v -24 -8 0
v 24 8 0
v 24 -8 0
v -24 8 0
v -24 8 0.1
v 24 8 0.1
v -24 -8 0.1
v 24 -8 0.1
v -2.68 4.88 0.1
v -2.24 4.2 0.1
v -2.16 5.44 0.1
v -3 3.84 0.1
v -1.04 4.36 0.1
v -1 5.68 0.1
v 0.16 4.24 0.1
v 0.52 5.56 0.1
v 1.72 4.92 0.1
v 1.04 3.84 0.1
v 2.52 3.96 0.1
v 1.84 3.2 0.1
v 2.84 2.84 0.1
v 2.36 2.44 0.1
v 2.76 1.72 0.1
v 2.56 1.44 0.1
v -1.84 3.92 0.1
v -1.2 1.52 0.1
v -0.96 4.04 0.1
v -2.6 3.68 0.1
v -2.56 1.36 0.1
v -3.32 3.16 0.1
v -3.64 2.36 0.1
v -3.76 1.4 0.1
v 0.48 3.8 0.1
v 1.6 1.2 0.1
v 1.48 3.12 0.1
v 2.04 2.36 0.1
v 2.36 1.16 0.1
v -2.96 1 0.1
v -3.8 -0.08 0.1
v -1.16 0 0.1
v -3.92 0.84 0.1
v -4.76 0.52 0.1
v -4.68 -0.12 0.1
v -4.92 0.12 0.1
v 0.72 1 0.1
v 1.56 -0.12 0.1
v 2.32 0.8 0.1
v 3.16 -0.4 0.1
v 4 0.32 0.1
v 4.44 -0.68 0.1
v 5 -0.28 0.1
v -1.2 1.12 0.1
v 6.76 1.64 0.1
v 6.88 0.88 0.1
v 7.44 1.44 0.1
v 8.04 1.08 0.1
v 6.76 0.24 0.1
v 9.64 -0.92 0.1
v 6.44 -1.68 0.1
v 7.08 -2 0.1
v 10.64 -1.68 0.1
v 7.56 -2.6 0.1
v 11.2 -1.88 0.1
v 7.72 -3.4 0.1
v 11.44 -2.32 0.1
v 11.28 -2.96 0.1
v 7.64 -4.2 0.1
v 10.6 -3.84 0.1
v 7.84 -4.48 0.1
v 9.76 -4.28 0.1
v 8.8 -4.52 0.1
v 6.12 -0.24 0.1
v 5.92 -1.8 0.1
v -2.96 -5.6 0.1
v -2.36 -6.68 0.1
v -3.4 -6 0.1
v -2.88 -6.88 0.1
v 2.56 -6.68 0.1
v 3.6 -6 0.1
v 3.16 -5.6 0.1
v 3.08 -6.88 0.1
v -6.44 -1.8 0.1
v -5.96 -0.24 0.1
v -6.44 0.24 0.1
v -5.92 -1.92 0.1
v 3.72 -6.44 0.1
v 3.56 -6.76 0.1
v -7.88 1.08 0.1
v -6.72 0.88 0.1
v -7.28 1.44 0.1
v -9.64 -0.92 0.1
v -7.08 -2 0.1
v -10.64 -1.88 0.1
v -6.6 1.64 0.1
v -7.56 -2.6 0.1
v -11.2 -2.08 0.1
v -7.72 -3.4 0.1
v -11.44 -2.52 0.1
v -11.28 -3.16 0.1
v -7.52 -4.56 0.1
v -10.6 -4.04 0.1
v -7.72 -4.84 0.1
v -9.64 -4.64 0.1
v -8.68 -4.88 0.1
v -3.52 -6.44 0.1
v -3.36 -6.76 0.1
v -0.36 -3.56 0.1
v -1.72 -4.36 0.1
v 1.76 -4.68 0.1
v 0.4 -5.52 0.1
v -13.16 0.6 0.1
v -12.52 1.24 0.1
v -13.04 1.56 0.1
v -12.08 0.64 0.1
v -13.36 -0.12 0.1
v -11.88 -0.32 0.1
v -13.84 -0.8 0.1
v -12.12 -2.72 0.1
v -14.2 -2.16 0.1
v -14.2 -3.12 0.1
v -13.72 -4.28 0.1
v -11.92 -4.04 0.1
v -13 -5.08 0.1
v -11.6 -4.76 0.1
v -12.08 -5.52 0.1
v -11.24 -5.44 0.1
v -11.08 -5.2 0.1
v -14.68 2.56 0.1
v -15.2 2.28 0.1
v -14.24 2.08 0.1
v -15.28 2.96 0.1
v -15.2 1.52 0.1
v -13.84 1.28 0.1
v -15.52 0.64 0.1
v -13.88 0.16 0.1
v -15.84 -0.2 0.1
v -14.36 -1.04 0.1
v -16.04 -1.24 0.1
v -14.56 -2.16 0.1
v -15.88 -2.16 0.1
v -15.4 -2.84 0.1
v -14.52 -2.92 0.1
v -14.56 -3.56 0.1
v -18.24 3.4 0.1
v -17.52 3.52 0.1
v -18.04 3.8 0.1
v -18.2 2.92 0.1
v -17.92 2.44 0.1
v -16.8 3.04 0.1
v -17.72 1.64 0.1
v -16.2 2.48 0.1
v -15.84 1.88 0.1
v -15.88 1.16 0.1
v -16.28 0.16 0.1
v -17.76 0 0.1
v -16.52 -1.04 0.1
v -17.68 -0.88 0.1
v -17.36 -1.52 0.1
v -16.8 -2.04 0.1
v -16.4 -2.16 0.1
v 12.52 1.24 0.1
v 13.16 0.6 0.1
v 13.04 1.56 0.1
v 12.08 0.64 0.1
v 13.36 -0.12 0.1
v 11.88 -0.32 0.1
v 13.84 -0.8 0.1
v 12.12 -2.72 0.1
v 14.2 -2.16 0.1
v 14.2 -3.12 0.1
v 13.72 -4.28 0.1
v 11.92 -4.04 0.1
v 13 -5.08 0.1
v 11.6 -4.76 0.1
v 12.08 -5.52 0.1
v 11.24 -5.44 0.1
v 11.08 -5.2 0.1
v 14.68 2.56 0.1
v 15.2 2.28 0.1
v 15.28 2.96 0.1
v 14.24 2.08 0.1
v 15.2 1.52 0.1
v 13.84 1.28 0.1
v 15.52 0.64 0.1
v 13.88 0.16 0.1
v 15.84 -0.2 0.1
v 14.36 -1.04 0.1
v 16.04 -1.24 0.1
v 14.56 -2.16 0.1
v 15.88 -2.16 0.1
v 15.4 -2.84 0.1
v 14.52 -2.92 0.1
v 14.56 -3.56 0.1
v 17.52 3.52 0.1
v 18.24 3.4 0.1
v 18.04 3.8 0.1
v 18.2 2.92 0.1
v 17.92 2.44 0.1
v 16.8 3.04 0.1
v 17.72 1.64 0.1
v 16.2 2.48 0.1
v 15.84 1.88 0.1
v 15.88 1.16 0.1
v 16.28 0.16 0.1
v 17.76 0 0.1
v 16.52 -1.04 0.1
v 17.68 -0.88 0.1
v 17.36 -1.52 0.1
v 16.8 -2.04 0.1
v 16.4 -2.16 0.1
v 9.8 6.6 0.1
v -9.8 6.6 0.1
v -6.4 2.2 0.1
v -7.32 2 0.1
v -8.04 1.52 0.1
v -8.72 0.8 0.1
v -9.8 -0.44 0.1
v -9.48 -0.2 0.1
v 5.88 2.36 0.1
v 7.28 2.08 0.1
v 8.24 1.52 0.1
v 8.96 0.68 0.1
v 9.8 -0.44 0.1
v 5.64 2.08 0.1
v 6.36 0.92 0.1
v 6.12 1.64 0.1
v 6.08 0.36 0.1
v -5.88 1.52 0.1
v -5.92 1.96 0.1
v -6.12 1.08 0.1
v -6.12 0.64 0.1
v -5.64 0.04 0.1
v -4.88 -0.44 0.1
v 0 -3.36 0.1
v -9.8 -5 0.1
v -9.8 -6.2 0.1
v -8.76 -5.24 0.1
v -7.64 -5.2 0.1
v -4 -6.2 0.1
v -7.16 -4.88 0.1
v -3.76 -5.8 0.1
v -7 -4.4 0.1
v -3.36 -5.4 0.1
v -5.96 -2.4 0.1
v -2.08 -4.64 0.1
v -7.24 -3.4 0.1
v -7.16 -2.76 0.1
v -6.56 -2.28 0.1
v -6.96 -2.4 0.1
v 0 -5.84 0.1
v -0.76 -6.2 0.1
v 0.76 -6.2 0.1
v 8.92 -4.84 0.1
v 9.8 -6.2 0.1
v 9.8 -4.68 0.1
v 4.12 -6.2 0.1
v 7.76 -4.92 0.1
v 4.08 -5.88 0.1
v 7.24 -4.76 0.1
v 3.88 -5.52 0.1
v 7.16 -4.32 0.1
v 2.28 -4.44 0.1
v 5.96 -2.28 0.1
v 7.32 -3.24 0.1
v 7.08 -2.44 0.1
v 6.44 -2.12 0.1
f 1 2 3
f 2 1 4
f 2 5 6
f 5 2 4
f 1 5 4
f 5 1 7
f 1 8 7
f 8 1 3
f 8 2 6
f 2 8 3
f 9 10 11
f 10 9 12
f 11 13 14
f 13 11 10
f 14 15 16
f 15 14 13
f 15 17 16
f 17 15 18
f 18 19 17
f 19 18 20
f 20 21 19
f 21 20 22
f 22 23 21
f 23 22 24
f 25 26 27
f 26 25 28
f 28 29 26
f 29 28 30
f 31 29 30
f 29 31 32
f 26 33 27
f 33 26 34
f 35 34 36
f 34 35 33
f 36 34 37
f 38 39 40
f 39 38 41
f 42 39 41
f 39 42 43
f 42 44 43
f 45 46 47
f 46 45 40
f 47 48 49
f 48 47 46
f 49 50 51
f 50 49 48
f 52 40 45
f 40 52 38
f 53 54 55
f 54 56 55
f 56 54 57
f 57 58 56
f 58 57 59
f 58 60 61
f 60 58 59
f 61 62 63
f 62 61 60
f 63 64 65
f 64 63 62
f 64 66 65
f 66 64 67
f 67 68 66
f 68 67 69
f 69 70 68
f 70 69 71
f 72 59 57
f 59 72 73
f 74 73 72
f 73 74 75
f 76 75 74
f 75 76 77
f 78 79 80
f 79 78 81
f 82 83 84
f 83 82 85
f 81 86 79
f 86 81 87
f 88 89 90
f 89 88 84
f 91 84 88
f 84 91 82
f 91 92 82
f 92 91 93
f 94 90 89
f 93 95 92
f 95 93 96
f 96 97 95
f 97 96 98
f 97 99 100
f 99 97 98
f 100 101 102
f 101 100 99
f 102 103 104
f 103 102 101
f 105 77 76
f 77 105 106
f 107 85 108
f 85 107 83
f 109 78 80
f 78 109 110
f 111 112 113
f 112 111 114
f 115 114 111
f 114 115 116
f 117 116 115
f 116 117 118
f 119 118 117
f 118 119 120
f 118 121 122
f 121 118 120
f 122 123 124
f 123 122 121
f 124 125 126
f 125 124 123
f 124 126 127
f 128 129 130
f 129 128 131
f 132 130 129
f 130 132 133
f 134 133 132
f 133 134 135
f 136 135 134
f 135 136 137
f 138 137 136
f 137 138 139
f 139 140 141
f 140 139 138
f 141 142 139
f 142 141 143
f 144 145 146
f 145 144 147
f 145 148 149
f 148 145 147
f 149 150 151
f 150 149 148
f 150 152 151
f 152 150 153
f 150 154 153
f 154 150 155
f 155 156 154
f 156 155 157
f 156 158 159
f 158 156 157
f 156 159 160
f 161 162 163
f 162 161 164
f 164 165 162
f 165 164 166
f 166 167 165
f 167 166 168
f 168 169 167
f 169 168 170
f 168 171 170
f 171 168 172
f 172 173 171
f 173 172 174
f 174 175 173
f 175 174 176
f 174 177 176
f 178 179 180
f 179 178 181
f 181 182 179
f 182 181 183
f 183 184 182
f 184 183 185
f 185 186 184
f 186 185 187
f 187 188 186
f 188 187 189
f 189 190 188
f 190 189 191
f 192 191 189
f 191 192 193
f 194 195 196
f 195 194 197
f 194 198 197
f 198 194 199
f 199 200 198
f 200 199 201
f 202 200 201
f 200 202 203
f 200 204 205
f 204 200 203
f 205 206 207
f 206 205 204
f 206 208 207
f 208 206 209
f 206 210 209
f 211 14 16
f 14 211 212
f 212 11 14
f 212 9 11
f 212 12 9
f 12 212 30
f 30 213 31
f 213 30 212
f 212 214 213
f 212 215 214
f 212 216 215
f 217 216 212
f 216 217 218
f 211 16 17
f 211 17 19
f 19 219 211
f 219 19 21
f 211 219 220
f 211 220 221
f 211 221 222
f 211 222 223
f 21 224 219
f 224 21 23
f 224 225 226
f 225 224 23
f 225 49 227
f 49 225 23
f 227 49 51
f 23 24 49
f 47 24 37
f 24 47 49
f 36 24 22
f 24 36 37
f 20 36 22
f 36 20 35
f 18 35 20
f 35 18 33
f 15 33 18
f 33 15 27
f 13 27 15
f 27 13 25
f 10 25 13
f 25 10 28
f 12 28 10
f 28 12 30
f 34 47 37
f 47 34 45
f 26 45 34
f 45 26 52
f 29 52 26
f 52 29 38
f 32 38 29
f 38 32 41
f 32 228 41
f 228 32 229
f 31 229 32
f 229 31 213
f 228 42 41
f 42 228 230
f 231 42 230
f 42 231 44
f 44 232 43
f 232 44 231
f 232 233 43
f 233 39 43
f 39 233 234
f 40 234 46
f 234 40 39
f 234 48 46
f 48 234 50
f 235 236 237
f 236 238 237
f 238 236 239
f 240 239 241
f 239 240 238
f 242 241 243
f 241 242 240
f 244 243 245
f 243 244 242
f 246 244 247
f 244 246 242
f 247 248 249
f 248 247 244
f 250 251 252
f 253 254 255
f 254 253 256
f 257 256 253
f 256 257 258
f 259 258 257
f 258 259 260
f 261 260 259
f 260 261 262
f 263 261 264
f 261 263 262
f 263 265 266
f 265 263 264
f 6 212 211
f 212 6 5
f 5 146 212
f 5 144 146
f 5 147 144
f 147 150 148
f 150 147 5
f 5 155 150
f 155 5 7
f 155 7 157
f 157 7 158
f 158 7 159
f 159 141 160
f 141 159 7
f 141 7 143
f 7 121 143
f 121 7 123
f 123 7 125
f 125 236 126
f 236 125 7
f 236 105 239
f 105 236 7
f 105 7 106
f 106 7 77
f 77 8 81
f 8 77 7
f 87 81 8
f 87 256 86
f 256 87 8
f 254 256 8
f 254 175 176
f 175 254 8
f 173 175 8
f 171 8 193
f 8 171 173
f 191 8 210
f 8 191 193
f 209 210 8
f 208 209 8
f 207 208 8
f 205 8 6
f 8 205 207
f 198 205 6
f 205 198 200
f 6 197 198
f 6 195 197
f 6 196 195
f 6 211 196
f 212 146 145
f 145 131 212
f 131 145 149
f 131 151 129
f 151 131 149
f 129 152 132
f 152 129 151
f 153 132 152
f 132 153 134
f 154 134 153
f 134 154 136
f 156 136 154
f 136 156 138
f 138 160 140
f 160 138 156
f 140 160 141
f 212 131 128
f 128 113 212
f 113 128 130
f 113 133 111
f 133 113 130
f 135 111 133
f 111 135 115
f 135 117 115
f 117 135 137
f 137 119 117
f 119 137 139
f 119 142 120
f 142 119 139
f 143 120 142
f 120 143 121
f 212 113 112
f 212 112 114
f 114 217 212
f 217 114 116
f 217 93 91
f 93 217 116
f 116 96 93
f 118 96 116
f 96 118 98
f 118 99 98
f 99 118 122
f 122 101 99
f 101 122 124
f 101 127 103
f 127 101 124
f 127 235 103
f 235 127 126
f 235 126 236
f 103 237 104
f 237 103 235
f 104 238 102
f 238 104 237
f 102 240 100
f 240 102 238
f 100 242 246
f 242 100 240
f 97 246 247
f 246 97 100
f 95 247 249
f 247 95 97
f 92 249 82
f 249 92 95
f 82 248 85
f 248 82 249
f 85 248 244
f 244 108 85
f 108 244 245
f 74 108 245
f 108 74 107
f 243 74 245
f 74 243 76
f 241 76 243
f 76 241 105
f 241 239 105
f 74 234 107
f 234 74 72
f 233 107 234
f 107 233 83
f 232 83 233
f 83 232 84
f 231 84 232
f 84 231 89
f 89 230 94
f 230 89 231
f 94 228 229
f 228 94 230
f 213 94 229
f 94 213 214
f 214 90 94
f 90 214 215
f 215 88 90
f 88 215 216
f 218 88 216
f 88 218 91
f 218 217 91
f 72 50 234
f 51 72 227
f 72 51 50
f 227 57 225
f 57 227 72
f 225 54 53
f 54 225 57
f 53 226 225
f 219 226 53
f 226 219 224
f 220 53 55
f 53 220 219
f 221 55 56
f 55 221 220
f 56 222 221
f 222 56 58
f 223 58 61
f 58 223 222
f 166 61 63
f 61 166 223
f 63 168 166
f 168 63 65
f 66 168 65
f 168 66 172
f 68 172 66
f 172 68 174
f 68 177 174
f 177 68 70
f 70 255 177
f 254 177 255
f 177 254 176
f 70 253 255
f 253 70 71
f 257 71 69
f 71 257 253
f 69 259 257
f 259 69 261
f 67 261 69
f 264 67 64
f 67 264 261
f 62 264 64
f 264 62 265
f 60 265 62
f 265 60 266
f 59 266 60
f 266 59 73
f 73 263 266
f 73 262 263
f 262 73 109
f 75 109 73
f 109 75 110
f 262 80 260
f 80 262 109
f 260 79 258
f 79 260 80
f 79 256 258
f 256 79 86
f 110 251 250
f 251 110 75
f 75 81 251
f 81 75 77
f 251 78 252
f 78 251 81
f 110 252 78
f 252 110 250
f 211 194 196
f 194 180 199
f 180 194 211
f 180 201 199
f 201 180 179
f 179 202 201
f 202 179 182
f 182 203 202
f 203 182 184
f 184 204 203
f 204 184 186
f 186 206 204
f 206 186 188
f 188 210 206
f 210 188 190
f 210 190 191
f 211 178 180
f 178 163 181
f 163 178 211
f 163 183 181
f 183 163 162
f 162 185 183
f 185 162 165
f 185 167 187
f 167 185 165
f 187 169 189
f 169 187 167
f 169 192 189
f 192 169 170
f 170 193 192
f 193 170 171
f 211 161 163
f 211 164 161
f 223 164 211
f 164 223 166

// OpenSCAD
// file: ../p/box5-12.scad
use <../lib.scad>
function ldraw_lib__box5_12() = [
// 0 Box with 5 Faces without Any Edges
// 0 Name: box5-12.dat
// 0 Author: Chris Dee [cwdee]
// 0 !LDRAW_ORG Primitive UPDATE 2009-02
// 0 !LICENSE Licensed under CC BY 4.0 : see CAreadme.txt
// 
// 0 BFC CERTIFY CCW
  [0,"BFC","CERTIFY"],
  [0,"BFC","CCW"],
// 
// 0 !HISTORY 2009-09-03 [PTadmin] Official Update 2009-02
// 
// 
// 4 16 1 1 1 1 1 -1 -1 1 -1 -1 1 1
  [4,16,1,1,1,1,1,-1,-1,1,-1,-1,1,1],
// 4 16 -1 0 1 1 0 1 1 1 1 -1 1 1
  [4,16,-1,0,1,1,0,1,1,1,1,-1,1,1],
// 4 16 -1 0 -1 -1 0 1 -1 1 1 -1 1 -1
  [4,16,-1,0,-1,-1,0,1,-1,1,1,-1,1,-1],
// 4 16 1 0 -1 -1 0 -1 -1 1 -1 1 1 -1
  [4,16,1,0,-1,-1,0,-1,-1,1,-1,1,1,-1],
// 4 16 1 0 1 1 0 -1 1 1 -1 1 1 1
  [4,16,1,0,1,1,0,-1,1,1,-1,1,1,1],
// 0
];
module ldraw_lib__box5_12(step=0, col=false, unit=2/5, alt=false, line=0.2, solid=!$preview)
    makepoly(ldraw_lib__box5_12(), step=step, col=col, unit=unit, alt=alt, line=line, solid=solid);
ldraw_lib__box5_12(line=0.2);
// main file
use <../lib.scad>
use <../p/box5-12.scad>
use <s/192895ds01.scad>
function ldraw_lib__192895f() = [
// 0 Sticker  2 x  6 with Fire Station Logo and Square Corners
// 0 Name: 192895f.dat
// 0 Author: Takeshi Takahashi [RainbowDolphin]
// 0 !LDRAW_ORG Part UPDATE 2024-10
// 0 !LICENSE Licensed under CC BY 4.0 : see CAreadme.txt
// 
// 0 BFC CERTIFY CCW
  [0,"BFC","CERTIFY"],
  [0,"BFC","CCW"],
// 
// 0 !KEYWORDS Bricklink 6382stk02a, Fire axe, Fire helmet, Rebrickable 192895
// 0 !KEYWORDS Set 6382, Sheet 2, Signboard, Version 1
// 
// 0 !HISTORY 2024-12-01 [OrionP] Official Update 2024-10
// 
// 1 16 0 -0.25 0 60 0 0 0 0.25 0 0 0 20 box5-12.dat
  [1,16,0,-0.25,0,60,0,0,0,0.25,0,0,0,20, ldraw_lib__box5_12()],
// 1 16 0 -.25 0 1 0 0 0 1 0 0 0 1 s\192895ds01.dat
  [1,16,0,-.25,0,1,0,0,0,1,0,0,0,1, ldraw_lib__s__192895ds01()],
];
module ldraw_lib__192895f(step=0, col=false, unit=2/5, alt=false, line=0.2, solid=!$preview)
    makepoly(ldraw_lib__192895f(), step=step, col=col, unit=unit, alt=alt, line=line, solid=solid);
ldraw_lib__192895f(line=0.2);
